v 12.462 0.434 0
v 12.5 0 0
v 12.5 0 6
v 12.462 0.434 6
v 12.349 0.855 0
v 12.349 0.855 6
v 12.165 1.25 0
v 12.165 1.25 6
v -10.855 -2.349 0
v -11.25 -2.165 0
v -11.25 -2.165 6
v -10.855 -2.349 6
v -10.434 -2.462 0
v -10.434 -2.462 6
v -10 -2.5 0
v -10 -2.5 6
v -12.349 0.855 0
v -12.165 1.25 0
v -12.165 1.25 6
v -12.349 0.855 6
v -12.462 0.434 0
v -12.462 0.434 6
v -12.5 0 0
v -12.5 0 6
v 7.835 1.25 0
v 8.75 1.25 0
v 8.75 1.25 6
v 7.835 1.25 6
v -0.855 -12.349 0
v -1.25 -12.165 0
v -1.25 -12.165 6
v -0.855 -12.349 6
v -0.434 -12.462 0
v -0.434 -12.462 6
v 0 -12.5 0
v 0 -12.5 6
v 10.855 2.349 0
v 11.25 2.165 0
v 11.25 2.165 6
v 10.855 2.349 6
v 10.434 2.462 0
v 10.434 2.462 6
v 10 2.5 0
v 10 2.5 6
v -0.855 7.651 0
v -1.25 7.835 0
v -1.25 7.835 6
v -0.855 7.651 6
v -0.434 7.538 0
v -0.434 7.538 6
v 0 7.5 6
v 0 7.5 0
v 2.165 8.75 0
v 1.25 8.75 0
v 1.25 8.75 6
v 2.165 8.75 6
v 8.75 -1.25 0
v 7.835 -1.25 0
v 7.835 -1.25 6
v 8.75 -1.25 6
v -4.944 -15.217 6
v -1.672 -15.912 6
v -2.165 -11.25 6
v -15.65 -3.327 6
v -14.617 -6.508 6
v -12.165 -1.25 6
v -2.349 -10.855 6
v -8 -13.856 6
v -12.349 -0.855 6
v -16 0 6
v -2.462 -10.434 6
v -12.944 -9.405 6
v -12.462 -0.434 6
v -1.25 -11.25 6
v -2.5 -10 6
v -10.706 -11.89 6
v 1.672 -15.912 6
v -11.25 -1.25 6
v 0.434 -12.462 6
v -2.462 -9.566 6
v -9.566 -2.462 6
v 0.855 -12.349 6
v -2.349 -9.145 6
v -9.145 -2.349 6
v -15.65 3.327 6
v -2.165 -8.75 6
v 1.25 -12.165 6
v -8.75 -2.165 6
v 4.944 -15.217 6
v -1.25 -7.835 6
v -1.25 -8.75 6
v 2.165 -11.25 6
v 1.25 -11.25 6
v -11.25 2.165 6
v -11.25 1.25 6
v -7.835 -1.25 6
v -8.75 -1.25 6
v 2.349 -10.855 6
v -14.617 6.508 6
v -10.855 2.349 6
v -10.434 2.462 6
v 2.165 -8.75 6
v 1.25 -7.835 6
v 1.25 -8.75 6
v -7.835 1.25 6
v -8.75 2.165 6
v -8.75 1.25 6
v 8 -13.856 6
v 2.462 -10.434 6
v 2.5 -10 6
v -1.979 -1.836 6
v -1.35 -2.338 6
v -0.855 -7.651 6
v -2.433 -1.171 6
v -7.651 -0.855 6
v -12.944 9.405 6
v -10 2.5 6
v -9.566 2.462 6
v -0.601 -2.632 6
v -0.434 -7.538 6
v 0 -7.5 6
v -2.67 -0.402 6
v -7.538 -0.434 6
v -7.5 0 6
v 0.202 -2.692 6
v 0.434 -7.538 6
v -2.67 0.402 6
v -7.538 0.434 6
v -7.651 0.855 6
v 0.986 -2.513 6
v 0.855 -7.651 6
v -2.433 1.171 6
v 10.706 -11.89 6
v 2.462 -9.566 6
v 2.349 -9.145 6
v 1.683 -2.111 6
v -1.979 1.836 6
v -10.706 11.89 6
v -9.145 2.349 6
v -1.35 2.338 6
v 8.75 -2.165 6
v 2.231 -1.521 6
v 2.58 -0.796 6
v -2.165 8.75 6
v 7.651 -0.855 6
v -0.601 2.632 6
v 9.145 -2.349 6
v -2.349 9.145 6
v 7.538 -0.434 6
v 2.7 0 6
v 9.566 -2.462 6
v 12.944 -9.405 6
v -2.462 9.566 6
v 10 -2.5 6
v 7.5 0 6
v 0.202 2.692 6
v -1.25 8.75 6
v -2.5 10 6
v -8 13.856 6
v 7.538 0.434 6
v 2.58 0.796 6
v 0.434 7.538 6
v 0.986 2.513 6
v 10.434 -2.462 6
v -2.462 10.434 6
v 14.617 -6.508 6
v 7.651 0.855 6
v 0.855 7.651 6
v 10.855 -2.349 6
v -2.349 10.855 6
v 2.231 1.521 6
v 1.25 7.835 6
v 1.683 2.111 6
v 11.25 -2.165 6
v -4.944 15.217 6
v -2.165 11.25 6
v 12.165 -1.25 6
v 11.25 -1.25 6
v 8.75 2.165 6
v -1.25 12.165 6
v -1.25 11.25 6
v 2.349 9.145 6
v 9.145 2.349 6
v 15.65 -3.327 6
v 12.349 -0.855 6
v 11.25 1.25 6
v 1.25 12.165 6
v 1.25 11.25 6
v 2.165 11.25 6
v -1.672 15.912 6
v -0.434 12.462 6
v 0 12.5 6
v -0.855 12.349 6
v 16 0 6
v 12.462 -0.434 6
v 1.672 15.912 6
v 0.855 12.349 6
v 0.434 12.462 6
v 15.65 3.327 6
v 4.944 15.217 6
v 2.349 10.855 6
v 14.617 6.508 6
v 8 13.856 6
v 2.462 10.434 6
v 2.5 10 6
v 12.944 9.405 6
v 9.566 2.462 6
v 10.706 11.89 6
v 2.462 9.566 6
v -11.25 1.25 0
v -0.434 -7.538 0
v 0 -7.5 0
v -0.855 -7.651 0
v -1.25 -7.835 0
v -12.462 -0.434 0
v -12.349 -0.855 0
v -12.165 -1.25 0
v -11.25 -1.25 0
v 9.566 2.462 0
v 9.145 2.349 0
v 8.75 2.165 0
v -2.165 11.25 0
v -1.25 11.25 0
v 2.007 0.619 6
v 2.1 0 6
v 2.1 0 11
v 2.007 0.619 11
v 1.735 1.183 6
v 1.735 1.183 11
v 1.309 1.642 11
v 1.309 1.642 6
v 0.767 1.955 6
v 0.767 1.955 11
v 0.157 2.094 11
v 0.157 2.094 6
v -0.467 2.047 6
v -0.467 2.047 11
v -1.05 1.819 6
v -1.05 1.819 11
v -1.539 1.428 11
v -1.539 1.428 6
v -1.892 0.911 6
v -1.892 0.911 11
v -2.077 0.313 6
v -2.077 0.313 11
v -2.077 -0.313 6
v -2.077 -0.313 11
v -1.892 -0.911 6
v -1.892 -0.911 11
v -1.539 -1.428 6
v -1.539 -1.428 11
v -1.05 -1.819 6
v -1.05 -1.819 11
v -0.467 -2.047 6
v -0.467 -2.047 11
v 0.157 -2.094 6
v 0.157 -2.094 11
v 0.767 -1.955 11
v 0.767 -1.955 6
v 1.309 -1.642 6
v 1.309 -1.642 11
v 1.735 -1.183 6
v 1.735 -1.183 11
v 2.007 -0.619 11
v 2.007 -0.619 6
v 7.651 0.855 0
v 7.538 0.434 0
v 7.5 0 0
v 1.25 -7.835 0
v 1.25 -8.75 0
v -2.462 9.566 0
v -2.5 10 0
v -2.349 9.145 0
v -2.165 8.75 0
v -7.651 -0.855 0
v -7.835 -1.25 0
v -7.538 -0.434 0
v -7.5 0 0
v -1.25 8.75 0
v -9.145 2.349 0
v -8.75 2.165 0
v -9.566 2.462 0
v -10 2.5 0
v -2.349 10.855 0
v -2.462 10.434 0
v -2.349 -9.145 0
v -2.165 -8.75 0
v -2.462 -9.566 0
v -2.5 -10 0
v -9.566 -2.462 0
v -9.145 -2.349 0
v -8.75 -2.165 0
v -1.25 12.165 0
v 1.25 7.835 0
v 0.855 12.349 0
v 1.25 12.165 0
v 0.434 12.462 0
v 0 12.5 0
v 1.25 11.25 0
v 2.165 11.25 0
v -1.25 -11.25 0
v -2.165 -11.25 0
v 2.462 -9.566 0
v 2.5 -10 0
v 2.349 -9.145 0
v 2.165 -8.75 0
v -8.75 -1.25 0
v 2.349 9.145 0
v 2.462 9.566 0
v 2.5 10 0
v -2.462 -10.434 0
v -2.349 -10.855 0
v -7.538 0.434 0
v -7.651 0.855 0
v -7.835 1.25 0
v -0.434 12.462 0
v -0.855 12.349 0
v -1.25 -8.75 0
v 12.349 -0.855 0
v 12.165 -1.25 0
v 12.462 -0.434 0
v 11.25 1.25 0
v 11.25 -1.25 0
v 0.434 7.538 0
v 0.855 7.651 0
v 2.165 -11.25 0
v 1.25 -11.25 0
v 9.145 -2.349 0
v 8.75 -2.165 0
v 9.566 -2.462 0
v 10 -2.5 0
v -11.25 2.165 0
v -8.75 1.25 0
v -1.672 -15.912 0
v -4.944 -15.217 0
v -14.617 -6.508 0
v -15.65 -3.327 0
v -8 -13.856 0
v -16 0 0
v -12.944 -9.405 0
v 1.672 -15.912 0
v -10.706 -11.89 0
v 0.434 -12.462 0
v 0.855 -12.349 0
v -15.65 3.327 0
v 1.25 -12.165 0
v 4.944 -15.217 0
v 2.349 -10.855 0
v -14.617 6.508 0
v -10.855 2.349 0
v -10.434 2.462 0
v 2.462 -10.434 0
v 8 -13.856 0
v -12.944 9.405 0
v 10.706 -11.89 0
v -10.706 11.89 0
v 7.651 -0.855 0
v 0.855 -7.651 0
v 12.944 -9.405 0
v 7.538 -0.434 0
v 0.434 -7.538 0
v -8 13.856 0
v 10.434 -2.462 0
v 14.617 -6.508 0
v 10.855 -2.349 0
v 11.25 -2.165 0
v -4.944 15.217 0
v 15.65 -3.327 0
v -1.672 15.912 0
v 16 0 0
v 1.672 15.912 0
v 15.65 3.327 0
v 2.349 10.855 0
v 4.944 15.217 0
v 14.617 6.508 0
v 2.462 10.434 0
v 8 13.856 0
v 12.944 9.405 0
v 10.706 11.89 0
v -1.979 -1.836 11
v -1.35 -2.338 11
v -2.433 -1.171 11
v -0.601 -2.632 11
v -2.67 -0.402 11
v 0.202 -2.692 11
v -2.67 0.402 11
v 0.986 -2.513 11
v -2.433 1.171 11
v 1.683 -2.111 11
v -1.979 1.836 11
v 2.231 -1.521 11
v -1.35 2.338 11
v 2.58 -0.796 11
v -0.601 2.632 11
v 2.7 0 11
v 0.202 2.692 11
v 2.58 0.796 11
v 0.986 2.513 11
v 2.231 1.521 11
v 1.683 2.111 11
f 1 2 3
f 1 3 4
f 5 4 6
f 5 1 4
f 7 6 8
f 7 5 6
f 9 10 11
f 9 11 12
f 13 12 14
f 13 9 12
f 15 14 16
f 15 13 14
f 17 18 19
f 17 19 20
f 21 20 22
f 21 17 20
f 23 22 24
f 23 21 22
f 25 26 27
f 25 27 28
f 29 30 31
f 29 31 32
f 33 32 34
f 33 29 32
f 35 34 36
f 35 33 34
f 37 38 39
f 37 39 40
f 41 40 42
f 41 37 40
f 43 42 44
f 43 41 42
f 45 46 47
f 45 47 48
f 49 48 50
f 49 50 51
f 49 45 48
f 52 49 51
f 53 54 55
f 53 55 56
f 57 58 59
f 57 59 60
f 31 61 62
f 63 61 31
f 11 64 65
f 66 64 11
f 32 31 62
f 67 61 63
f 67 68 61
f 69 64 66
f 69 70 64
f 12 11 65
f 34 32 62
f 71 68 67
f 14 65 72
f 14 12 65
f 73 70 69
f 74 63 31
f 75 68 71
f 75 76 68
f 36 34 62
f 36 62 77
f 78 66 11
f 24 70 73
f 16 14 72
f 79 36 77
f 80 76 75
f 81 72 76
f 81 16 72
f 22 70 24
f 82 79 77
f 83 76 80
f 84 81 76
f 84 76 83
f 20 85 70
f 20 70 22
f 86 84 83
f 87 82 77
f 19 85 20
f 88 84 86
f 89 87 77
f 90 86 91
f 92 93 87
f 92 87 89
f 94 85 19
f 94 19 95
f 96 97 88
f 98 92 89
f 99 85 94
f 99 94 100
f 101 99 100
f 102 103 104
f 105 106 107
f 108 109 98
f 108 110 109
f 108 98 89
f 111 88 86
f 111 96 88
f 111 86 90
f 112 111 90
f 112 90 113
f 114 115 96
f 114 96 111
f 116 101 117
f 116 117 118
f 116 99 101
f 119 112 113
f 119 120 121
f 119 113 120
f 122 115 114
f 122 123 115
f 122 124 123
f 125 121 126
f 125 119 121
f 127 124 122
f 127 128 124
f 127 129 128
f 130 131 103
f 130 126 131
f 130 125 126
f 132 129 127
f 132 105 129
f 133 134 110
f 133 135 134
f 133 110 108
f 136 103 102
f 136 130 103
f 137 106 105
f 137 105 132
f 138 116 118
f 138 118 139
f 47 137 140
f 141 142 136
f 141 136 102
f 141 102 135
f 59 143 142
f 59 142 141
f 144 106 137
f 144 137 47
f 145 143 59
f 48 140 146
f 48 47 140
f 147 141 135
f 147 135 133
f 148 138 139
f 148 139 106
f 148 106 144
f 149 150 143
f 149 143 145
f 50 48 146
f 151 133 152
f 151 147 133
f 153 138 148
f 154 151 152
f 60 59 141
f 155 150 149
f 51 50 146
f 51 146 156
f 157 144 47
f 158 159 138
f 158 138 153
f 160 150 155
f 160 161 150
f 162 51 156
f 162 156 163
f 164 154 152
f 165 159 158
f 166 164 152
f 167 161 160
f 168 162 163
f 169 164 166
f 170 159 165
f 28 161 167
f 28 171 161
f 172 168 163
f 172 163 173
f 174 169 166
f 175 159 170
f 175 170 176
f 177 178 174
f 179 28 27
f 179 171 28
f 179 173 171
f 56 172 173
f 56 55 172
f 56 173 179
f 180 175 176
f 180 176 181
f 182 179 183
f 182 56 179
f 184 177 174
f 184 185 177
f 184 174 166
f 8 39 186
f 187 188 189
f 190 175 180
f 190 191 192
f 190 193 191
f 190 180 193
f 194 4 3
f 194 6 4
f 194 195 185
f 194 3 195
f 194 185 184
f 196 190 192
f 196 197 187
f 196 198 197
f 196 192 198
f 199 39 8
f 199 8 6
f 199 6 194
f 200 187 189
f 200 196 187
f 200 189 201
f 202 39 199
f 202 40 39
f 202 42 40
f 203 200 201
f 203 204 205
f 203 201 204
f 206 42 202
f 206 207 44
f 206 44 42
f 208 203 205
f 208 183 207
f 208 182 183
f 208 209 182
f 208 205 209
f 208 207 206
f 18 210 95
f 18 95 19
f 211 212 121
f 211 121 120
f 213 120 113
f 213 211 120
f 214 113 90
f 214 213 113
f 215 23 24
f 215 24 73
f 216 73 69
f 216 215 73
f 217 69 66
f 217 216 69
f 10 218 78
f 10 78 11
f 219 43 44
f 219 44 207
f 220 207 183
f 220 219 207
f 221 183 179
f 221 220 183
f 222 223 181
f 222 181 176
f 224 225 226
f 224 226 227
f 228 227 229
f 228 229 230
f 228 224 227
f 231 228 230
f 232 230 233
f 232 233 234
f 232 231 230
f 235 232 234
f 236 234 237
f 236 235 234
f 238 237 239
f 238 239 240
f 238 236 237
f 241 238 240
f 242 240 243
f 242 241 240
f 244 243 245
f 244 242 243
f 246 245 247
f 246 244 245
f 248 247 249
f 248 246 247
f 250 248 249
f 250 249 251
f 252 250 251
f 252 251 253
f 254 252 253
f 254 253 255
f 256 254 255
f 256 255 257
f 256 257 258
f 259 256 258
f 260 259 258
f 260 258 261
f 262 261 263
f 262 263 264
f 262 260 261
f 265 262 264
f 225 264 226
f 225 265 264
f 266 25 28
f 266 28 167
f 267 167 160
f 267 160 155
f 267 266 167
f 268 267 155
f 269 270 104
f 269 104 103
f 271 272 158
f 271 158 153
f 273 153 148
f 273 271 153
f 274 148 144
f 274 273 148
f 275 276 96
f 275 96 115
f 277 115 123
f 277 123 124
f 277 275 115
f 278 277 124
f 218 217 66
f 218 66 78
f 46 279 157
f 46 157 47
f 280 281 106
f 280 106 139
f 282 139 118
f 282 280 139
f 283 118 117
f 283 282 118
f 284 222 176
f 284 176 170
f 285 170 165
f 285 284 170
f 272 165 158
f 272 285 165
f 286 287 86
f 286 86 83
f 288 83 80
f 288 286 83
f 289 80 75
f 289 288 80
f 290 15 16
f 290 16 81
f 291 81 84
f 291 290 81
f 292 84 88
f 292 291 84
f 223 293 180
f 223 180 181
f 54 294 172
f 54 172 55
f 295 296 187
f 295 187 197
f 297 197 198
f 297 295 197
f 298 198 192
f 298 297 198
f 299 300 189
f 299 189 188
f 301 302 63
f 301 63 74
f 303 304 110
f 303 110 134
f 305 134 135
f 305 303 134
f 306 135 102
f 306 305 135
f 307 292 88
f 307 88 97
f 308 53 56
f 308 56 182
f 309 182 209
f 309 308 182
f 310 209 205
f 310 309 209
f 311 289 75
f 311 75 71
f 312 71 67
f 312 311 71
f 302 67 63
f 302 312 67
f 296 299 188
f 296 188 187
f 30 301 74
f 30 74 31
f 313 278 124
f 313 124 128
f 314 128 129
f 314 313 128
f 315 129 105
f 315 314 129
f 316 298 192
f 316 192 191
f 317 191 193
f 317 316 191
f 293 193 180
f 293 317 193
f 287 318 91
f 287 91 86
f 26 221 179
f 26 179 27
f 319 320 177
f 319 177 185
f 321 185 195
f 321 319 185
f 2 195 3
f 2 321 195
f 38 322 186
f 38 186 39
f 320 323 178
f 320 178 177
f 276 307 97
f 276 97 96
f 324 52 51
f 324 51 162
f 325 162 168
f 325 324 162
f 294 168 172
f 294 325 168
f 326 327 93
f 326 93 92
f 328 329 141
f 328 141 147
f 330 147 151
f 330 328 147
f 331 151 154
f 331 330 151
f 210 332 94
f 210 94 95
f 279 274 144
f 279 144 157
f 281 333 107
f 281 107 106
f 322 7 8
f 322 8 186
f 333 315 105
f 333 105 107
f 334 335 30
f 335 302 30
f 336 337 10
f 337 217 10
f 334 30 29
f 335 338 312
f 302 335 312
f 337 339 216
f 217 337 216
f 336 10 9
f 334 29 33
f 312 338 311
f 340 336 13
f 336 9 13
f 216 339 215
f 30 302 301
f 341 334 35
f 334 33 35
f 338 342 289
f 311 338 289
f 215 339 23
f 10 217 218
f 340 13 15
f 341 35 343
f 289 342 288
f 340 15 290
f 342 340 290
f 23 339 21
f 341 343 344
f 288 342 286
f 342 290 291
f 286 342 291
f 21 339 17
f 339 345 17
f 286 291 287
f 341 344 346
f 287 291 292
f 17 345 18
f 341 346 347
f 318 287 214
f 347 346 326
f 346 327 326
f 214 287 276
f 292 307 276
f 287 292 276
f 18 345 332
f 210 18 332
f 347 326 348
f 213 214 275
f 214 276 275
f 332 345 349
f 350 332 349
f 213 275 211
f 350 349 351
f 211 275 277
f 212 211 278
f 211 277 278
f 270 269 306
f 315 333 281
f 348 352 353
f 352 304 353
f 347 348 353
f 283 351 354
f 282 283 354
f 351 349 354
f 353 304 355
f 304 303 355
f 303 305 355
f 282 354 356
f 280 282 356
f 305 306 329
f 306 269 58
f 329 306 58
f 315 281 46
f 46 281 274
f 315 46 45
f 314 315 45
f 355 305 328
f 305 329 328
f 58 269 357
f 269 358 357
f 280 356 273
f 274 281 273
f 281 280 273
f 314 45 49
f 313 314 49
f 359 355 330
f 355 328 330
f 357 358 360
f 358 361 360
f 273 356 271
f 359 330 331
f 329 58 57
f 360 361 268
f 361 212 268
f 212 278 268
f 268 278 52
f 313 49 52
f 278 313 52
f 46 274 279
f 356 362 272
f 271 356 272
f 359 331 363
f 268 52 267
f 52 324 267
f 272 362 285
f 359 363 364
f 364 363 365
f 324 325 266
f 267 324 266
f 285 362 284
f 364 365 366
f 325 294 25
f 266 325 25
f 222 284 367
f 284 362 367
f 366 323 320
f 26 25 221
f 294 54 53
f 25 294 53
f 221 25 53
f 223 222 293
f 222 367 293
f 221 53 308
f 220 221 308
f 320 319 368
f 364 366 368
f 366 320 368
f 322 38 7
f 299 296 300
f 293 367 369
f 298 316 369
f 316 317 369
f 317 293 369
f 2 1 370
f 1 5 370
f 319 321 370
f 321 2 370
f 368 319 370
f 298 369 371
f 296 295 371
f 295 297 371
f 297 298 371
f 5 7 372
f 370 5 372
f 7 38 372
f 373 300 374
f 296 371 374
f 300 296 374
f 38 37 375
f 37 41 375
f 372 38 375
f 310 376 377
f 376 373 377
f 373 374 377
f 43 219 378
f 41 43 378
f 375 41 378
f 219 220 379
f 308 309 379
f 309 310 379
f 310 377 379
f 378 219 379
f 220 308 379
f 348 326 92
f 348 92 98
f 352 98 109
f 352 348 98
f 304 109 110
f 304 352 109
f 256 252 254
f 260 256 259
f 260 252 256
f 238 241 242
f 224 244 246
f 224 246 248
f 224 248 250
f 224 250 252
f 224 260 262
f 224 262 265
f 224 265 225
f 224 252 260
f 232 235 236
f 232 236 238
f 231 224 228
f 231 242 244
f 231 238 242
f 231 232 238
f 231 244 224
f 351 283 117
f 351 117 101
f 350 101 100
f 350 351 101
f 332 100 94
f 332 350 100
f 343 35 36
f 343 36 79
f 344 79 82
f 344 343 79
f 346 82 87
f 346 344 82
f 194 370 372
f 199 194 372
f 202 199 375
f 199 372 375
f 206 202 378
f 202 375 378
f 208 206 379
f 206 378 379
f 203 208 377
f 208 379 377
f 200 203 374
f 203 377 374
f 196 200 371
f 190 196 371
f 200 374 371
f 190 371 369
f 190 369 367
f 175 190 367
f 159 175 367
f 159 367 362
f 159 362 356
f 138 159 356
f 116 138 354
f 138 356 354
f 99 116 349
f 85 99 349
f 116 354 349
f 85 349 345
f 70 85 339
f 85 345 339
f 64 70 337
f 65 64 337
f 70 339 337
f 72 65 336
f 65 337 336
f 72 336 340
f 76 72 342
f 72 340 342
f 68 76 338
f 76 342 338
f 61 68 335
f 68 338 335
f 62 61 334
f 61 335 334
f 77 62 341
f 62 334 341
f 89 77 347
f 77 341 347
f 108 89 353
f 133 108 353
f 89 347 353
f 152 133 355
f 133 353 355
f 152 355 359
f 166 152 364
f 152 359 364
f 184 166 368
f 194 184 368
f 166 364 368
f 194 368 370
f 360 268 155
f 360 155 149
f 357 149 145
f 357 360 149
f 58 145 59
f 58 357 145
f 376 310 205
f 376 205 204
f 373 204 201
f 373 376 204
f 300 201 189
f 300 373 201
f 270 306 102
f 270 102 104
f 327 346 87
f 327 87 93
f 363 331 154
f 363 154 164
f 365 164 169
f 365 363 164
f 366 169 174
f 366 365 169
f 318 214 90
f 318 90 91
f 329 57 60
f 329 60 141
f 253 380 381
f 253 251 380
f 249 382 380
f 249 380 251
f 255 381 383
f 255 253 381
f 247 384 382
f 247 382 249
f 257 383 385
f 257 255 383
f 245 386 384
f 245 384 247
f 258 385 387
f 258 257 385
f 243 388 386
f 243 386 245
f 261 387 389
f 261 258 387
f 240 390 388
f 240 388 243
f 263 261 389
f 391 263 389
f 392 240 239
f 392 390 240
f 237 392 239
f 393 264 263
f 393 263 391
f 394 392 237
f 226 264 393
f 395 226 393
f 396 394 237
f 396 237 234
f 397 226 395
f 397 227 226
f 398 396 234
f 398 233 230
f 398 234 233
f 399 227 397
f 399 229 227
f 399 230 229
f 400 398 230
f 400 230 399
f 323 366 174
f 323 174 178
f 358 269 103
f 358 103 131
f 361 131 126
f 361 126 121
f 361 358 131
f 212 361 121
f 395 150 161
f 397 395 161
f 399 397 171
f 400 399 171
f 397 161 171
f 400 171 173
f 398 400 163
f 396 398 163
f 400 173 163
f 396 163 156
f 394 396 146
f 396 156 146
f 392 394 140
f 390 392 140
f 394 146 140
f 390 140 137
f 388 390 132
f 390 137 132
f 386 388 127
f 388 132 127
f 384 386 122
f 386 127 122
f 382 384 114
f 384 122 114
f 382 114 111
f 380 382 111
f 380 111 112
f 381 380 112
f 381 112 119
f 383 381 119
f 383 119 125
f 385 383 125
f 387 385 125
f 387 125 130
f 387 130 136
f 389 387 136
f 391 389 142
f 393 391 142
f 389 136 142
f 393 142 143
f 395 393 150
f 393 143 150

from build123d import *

# Parameters (mm, degrees)
CROQUIS1_R              = 16
SALIENTE_EXTRUIR1_DEPTH = 6
CROQUIS2_R              = 2.7
CROQUIS2_R_2            = 2.1
SALIENTE_EXTRUIR2_DEPTH = 5


with BuildPart() as part:
    # Croquis1 → Saliente-Extruir1 (new body)
    with BuildSketch(Plane.XY):
        Circle(CROQUIS1_R)
        with BuildLine():
            Line((2.165063509, 11.25), (1.25, 11.25))
            Line((1.25, 11.25), (1.25, 12.165063509))
            ThreePointArc((1.25, 12.165063509), (0.647047613, 12.414814566), (0, 12.5))
            ThreePointArc((0, 12.5), (-0.647047613, 12.414814566), (-1.25, 12.165063509))
            Line((-1.25, 12.165063509), (-1.25, 11.25))
            Line((-1.25, 11.25), (-2.165063509, 11.25))
            ThreePointArc((-2.165063509, 11.25), (-2.414814566, 10.647047613), (-2.5, 10))
            ThreePointArc((-2.5, 10), (-2.414814566, 9.352952387), (-2.165063509, 8.75))
            Line((-2.165063509, 8.75), (-1.25, 8.75))
            Line((-1.25, 8.75), (-1.25, 7.834936491))
            ThreePointArc((-1.25, 7.834936491), (-0.647047613, 7.585185434), (0, 7.5))
            ThreePointArc((0, 7.5), (0.647047613, 7.585185434), (1.25, 7.834936491))
            Line((1.25, 7.834936491), (1.25, 8.75))
            Line((1.25, 8.75), (2.165063509, 8.75))
            ThreePointArc((2.165063509, 8.75), (2.414814566, 9.352952387), (2.5, 10))
            ThreePointArc((2.5, 10), (2.414814566, 10.647047613), (2.165063509, 11.25))
        make_face(mode=Mode.SUBTRACT)
        with BuildLine():
            Line((11.25, -1.25), (12.165063509, -1.25))
            ThreePointArc((12.165063509, -1.25), (12.414814566, -0.647047613), (12.5, 0))
            ThreePointArc((12.5, 0), (12.414814566, 0.647047613), (12.165063509, 1.25))
            Line((12.165063509, 1.25), (11.25, 1.25))
            Line((11.25, 1.25), (11.25, 2.165063509))
            ThreePointArc((11.25, 2.165063509), (10.647047613, 2.414814566), (10, 2.5))
            ThreePointArc((10, 2.5), (9.352952387, 2.414814566), (8.75, 2.165063509))
            Line((8.75, 2.165063509), (8.75, 1.25))
            Line((8.75, 1.25), (7.834936491, 1.25))
            ThreePointArc((7.834936491, 1.25), (7.585185434, 0.647047613), (7.5, 0))
            ThreePointArc((7.5, 0), (7.585185434, -0.647047613), (7.834936491, -1.25))
            Line((7.834936491, -1.25), (8.75, -1.25))
            Line((8.75, -1.25), (8.75, -2.165063509))
            ThreePointArc((8.75, -2.165063509), (9.352952387, -2.414814566), (10, -2.5))
            ThreePointArc((10, -2.5), (10.647047613, -2.414814566), (11.25, -2.165063509))
            Line((11.25, -2.165063509), (11.25, -1.25))
        make_face(mode=Mode.SUBTRACT)
        with BuildLine():
            Line((-1.25, -11.25), (-1.25, -12.165063509))
            ThreePointArc((-1.25, -12.165063509), (-0.647047613, -12.414814566), (0, -12.5))
            ThreePointArc((0, -12.5), (0.647047613, -12.414814566), (1.25, -12.165063509))
            Line((1.25, -12.165063509), (1.25, -11.25))
            Line((1.25, -11.25), (2.165063509, -11.25))
            ThreePointArc((2.165063509, -11.25), (2.414814566, -10.647047613), (2.5, -10))
            ThreePointArc((2.5, -10), (2.414814566, -9.352952387), (2.165063509, -8.75))
            Line((2.165063509, -8.75), (1.25, -8.75))
            Line((1.25, -8.75), (1.25, -7.834936491))
            ThreePointArc((1.25, -7.834936491), (0.647047613, -7.585185434), (0, -7.5))
            ThreePointArc((0, -7.5), (-0.647047613, -7.585185434), (-1.25, -7.834936491))
            Line((-1.25, -7.834936491), (-1.25, -8.75))
            Line((-1.25, -8.75), (-2.165063509, -8.75))
            ThreePointArc((-2.165063509, -8.75), (-2.414814566, -9.352952387), (-2.5, -10))
            ThreePointArc((-2.5, -10), (-2.414814566, -10.647047613), (-2.165063509, -11.25))
            Line((-2.165063509, -11.25), (-1.25, -11.25))
        make_face(mode=Mode.SUBTRACT)
        with BuildLine():
            Line((-11.25, 1.25), (-12.165063509, 1.25))
            ThreePointArc((-12.165063509, 1.25), (-12.414814566, 0.647047613), (-12.5, 0))
            ThreePointArc((-12.5, 0), (-12.414814566, -0.647047613), (-12.165063509, -1.25))
            Line((-12.165063509, -1.25), (-11.25, -1.25))
            Line((-11.25, -1.25), (-11.25, -2.165063509))
            ThreePointArc((-11.25, -2.165063509), (-10.647047613, -2.414814566), (-10, -2.5))
            ThreePointArc((-10, -2.5), (-9.352952387, -2.414814566), (-8.75, -2.165063509))
            Line((-8.75, -2.165063509), (-8.75, -1.25))
            Line((-8.75, -1.25), (-7.834936491, -1.25))
            ThreePointArc((-7.834936491, -1.25), (-7.585185434, -0.647047613), (-7.5, 0))
            ThreePointArc((-7.5, 0), (-7.585185434, 0.647047613), (-7.834936491, 1.25))
            Line((-7.834936491, 1.25), (-8.75, 1.25))
            Line((-8.75, 1.25), (-8.75, 2.165063509))
            ThreePointArc((-8.75, 2.165063509), (-9.352952387, 2.414814566), (-10, 2.5))
            ThreePointArc((-10, 2.5), (-10.647047613, 2.414814566), (-11.25, 2.165063509))
            Line((-11.25, 2.165063509), (-11.25, 1.25))
        make_face(mode=Mode.SUBTRACT)
    extrude(amount=SALIENTE_EXTRUIR1_DEPTH)

    # Croquis2 → Saliente-Extruir2 (add)
    with BuildSketch(Plane.XY.offset(6)):
        Circle(CROQUIS2_R)
        Circle(CROQUIS2_R_2, mode=Mode.SUBTRACT)
    extrude(amount=SALIENTE_EXTRUIR2_DEPTH)


solid = part.part
